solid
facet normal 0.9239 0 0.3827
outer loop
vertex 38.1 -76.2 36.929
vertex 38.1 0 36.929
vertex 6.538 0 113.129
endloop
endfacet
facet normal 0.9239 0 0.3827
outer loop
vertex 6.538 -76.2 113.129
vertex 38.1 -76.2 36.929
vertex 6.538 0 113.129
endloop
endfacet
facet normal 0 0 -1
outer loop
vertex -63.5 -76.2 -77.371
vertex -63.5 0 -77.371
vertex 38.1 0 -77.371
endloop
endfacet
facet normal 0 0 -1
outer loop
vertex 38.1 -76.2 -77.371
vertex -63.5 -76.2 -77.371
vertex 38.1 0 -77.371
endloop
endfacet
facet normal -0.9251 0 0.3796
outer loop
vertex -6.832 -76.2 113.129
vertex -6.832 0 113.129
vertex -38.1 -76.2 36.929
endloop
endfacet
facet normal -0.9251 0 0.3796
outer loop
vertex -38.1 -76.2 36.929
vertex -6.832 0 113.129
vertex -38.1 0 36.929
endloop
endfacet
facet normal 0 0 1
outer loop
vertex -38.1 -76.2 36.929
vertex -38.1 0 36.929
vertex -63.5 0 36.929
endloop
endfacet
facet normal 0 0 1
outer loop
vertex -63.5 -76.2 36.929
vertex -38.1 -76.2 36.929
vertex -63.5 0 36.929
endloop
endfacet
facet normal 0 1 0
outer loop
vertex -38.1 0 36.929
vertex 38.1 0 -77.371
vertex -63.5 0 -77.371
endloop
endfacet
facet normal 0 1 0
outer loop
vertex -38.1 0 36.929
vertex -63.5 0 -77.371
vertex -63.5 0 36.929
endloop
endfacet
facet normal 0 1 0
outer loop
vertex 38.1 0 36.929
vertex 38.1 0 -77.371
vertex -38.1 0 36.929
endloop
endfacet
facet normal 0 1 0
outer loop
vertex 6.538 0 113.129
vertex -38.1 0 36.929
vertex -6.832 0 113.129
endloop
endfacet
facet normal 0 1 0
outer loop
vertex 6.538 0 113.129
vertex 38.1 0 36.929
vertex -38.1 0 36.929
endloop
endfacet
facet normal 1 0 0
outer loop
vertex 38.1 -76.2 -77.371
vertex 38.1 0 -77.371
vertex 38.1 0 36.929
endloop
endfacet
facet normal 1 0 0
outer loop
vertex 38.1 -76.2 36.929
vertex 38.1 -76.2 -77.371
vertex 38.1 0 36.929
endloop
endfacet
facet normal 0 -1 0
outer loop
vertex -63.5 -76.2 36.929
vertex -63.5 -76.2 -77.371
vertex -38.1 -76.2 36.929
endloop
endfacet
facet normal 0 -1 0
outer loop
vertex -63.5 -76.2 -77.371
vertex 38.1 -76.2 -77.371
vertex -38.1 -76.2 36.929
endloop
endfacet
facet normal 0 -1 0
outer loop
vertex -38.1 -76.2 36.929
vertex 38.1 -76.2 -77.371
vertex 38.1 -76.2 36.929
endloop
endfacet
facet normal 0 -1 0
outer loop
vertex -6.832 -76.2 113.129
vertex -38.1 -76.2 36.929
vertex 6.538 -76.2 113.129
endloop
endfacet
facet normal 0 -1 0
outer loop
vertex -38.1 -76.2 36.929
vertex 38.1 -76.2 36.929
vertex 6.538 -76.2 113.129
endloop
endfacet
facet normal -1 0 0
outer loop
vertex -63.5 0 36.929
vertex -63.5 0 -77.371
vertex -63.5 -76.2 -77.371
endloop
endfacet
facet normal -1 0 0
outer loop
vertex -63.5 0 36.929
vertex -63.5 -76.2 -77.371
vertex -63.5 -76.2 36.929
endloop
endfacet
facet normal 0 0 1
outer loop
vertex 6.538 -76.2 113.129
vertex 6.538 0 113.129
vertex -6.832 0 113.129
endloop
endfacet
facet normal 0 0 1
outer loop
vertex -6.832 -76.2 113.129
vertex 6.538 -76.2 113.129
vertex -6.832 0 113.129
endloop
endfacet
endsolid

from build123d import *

# Parameters (mm, degrees)
F0_W     = 9.525
F0_H     = 114.3
F1_DEPTH = 76.2
F3_DEPTH = 26.416
F4_DEPTH = 66.294
F5_DEPTH = 25.4
F6_DEPTH = 22.098


with BuildPart() as f1:
    # F0 (on Front) → F1 (new body)
    with BuildSketch(Plane.XZ):
        Polygon((6.5378730087, 113.1293577969), (0, 113.1293577969), (-6.8322808368, 113.1293577969), (-38.1, 36.9293577969), (-28.575, 36.9293577969), (-19.05, 36.9293577969), (-9.525, 36.9293577969), (0, 36.9293577969), (9.525, 36.9293577969), (19.05, 36.9293577969), (28.575, 36.9293577969), (38.1, 36.9293577969), align=None)
        with Locations((-33.3375, -20.2206422031)):
            Rectangle(F0_W, F0_H)
        with Locations((33.3375, -20.2206422031)):
            Rectangle(F0_W, F0_H)
        with Locations((-23.8125, -20.2206422031)):
            Rectangle(F0_W, F0_H)
        with Locations((23.8125, -20.2206422031)):
            Rectangle(F0_W, F0_H)
        with Locations((-14.2875, -20.2206422031)):
            Rectangle(F0_W, F0_H)
        with Locations((14.2875, -20.2206422031)):
            Rectangle(F0_W, F0_H)
        with Locations((-4.7625, -20.2206422031)):
            Rectangle(F0_W, F0_H)
        with Locations((4.7625, -20.2206422031)):
            Rectangle(F0_W, F0_H)
    extrude(amount=F1_DEPTH)

    # F3 (add): a face of the model
    f3_faces = [f1.faces().sort_by_distance(p)[0] for p in [
        (-0.0158753799, -76.2, 4.0859057687),
    ]]
    extrude(f3_faces, amount=-F3_DEPTH)

    # F0 (on Front) → F4 (join)
    with BuildSketch(Plane.XZ):
        Polygon((6.5378730087, 113.1293577969), (0, 113.1293577969), (-6.8322808368, 113.1293577969), (-38.1, 36.9293577969), (-28.575, 36.9293577969), (-19.05, 36.9293577969), (-9.525, 36.9293577969), (0, 36.9293577969), (9.525, 36.9293577969), (19.05, 36.9293577969), (28.575, 36.9293577969), (38.1, 36.9293577969), align=None)
        with Locations((-33.3375, -20.2206422031)):
            Rectangle(F0_W, F0_H)
        with Locations((33.3375, -20.2206422031)):
            Rectangle(F0_W, F0_H)
        with Locations((-23.8125, -20.2206422031)):
            Rectangle(F0_W, F0_H)
        with Locations((23.8125, -20.2206422031)):
            Rectangle(F0_W, F0_H)
        with Locations((-14.2875, -20.2206422031)):
            Rectangle(F0_W, F0_H)
        with Locations((14.2875, -20.2206422031)):
            Rectangle(F0_W, F0_H)
        with Locations((-4.7625, -20.2206422031)):
            Rectangle(F0_W, F0_H)
        with Locations((4.7625, -20.2206422031)):
            Rectangle(F0_W, F0_H)
    extrude(amount=F4_DEPTH)

    # F5 (add): a face of the model
    f5_faces = [f1.faces().sort_by_distance(p)[0] for p in [
        (-38.1, -38.1, -20.2206422031),
    ]]
    extrude(f5_faces, amount=F5_DEPTH)

    # F6 (add): a face of the model
    f6_faces = [f1.faces().sort_by_distance(p)[0] for p in [
        (-9.8283580395, 0, -0.6105930343),
    ]]
    extrude(f6_faces, amount=-F6_DEPTH)


solid = f1.part
